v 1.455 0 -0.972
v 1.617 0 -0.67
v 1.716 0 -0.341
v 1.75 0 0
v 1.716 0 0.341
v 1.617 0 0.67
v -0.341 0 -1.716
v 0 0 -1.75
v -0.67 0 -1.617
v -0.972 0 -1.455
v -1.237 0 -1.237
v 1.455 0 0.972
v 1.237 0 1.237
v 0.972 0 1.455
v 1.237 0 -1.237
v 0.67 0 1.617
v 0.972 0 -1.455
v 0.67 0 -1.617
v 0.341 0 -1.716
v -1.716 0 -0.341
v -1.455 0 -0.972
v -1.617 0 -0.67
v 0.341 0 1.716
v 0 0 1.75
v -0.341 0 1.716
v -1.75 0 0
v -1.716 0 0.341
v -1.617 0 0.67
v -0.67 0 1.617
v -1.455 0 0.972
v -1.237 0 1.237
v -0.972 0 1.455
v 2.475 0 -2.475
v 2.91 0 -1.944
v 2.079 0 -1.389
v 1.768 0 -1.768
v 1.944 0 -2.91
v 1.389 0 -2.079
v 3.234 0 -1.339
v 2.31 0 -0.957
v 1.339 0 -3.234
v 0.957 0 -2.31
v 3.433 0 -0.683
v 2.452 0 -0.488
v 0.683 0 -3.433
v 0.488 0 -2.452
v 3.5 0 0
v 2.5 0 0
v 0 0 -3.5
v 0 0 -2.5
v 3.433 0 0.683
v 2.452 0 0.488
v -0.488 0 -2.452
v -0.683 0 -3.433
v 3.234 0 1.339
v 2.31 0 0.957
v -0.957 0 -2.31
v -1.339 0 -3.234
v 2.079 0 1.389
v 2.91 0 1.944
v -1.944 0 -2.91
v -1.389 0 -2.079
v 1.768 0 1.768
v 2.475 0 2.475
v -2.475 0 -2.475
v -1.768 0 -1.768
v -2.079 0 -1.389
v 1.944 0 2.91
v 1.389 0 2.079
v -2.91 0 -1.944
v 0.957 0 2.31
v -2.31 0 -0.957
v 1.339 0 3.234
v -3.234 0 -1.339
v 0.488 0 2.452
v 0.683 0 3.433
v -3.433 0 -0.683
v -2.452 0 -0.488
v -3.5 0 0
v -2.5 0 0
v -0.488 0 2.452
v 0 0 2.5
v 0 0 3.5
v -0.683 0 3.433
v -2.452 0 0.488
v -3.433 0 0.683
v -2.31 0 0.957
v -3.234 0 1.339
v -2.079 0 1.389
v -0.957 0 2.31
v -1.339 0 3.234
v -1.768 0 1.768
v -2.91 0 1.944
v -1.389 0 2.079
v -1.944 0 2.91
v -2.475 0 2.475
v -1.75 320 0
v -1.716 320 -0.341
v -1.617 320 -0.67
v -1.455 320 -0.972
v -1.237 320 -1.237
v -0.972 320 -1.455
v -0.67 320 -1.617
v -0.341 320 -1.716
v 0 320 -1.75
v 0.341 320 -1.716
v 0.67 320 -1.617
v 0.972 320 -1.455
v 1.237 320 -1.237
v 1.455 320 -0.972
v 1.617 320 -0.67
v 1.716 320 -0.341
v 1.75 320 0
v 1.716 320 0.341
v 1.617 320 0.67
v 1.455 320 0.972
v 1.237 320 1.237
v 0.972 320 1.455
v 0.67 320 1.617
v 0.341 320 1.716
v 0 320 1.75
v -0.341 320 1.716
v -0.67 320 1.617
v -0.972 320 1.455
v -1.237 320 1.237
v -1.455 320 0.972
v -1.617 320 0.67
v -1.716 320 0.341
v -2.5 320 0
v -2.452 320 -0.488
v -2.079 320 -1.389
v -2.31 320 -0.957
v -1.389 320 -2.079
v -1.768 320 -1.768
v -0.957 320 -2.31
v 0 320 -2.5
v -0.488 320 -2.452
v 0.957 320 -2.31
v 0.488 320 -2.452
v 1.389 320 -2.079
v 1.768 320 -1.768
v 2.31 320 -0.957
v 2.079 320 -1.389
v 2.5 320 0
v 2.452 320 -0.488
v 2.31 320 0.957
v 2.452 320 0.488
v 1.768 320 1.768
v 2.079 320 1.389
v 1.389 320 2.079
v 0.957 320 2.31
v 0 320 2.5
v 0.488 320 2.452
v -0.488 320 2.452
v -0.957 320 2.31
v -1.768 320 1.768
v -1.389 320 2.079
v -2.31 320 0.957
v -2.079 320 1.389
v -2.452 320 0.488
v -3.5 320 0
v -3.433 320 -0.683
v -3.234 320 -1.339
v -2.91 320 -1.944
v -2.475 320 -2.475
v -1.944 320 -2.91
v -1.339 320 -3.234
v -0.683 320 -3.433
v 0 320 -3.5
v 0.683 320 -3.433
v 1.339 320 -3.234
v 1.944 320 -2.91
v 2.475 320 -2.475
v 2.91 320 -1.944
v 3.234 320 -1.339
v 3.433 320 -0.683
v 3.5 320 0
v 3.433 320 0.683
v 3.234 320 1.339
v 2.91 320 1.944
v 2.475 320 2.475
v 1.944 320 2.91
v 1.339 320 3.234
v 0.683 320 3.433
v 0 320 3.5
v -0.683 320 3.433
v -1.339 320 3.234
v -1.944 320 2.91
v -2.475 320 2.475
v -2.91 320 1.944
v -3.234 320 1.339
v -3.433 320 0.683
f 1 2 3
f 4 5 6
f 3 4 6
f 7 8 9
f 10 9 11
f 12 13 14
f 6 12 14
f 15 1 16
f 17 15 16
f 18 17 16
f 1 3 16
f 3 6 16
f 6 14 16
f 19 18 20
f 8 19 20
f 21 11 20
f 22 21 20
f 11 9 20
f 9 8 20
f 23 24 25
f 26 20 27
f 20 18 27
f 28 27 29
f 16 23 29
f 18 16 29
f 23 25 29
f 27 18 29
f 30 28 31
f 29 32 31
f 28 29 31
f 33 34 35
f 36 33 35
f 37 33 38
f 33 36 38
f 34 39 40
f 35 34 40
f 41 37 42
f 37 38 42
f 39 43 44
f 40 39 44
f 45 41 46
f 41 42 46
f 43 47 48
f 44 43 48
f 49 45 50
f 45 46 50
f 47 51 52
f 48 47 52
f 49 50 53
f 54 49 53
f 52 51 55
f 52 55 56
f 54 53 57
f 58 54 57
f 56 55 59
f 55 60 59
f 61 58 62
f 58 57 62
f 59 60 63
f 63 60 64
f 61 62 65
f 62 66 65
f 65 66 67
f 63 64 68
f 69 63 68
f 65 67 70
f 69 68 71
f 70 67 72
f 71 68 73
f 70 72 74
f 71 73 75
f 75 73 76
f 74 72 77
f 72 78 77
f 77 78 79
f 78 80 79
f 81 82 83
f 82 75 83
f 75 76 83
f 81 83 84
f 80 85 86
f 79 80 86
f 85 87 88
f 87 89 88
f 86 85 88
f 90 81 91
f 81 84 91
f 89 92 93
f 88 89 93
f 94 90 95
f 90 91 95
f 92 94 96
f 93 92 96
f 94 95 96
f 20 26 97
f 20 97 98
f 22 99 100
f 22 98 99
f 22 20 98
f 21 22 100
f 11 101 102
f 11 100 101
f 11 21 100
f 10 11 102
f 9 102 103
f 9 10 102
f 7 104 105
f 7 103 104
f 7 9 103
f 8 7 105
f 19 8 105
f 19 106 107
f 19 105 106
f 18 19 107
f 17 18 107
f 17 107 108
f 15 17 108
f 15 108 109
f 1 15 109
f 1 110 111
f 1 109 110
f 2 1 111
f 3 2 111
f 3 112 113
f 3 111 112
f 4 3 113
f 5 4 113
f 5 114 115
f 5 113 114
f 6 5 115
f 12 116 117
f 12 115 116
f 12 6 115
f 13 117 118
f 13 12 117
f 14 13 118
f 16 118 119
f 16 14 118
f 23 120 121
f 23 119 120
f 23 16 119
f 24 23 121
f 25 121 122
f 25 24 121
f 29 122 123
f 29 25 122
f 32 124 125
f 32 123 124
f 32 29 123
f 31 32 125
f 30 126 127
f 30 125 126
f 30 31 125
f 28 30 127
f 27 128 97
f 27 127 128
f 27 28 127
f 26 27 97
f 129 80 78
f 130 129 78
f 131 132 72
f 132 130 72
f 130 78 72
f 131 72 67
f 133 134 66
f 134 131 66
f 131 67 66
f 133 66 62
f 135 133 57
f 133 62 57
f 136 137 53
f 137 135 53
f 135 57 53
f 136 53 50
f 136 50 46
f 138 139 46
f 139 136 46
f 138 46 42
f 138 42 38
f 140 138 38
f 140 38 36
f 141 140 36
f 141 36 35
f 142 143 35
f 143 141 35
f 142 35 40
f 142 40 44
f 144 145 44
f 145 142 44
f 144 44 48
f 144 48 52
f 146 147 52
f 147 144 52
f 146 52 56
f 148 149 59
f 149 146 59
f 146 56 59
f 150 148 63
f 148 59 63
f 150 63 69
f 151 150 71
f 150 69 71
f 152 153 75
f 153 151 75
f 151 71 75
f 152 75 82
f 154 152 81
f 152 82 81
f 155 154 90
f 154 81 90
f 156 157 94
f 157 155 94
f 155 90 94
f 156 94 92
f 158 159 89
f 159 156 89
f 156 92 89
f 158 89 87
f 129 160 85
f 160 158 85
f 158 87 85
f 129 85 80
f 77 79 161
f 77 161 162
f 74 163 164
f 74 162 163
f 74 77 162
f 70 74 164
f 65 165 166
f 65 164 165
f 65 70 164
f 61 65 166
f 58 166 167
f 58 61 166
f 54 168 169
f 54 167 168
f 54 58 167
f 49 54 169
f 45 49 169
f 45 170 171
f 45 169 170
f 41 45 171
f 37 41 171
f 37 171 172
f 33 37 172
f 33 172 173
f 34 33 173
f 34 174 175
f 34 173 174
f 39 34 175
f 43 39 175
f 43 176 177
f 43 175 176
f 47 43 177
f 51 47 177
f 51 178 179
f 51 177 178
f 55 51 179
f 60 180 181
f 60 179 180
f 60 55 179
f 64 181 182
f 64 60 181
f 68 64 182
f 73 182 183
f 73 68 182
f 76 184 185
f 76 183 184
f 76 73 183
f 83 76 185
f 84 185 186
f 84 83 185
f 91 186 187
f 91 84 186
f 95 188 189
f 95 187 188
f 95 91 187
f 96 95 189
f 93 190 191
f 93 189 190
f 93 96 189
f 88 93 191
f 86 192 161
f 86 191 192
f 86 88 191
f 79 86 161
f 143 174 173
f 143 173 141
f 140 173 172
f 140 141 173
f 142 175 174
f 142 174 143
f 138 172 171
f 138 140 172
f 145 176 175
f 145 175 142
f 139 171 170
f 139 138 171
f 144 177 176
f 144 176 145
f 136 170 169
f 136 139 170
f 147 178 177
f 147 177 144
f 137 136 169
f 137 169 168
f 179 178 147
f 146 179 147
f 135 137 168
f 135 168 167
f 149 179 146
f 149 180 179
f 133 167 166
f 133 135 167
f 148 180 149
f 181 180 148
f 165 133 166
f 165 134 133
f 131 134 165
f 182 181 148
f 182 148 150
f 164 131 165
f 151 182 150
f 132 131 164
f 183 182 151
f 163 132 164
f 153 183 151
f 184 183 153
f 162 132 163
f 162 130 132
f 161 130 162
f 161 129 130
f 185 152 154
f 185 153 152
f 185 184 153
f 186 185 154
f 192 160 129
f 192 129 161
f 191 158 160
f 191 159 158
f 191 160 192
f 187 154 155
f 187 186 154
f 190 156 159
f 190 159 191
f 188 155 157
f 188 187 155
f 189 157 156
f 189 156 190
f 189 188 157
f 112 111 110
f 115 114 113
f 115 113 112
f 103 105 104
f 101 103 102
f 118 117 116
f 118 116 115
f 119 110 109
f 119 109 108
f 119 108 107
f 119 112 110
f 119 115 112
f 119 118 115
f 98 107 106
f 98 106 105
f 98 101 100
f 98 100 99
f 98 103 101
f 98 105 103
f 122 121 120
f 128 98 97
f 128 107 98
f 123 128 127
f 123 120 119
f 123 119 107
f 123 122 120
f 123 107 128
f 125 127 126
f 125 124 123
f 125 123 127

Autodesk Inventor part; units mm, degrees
ref_plane "YZ Plane" through (0, 0, 0) normal (1, 0, 0) x (0, 1, 0)
ref_plane "XZ Plane" through (0, 0, 0) normal (0, 1, 0) x (-1, 0, 0)
ref_plane "XY Plane" through (0, 0, 0) normal (0, 0, 1) x (1, 0, 0)
sketch "Эскиз1" plane through (0, 0, 0) normal (0, 1, 0) x (-1, 0, 0)
  circle A0 centre (0, 0) radius 3.5
  circle A1 centre (0, 0) radius 2.5
  circle A2 centre (0, 0) radius 1.75
  dimension "d0" = 7
  dimension "d1" = 5
  dimension "d2" = 3.5
extrude "Выдавливание1" add sketch "Эскиз1" along normal blind 320 contours A2
extrude "Выдавливание2" add sketch "Эскиз1" along normal blind 320 contours A0
properties part number "wire_A"
